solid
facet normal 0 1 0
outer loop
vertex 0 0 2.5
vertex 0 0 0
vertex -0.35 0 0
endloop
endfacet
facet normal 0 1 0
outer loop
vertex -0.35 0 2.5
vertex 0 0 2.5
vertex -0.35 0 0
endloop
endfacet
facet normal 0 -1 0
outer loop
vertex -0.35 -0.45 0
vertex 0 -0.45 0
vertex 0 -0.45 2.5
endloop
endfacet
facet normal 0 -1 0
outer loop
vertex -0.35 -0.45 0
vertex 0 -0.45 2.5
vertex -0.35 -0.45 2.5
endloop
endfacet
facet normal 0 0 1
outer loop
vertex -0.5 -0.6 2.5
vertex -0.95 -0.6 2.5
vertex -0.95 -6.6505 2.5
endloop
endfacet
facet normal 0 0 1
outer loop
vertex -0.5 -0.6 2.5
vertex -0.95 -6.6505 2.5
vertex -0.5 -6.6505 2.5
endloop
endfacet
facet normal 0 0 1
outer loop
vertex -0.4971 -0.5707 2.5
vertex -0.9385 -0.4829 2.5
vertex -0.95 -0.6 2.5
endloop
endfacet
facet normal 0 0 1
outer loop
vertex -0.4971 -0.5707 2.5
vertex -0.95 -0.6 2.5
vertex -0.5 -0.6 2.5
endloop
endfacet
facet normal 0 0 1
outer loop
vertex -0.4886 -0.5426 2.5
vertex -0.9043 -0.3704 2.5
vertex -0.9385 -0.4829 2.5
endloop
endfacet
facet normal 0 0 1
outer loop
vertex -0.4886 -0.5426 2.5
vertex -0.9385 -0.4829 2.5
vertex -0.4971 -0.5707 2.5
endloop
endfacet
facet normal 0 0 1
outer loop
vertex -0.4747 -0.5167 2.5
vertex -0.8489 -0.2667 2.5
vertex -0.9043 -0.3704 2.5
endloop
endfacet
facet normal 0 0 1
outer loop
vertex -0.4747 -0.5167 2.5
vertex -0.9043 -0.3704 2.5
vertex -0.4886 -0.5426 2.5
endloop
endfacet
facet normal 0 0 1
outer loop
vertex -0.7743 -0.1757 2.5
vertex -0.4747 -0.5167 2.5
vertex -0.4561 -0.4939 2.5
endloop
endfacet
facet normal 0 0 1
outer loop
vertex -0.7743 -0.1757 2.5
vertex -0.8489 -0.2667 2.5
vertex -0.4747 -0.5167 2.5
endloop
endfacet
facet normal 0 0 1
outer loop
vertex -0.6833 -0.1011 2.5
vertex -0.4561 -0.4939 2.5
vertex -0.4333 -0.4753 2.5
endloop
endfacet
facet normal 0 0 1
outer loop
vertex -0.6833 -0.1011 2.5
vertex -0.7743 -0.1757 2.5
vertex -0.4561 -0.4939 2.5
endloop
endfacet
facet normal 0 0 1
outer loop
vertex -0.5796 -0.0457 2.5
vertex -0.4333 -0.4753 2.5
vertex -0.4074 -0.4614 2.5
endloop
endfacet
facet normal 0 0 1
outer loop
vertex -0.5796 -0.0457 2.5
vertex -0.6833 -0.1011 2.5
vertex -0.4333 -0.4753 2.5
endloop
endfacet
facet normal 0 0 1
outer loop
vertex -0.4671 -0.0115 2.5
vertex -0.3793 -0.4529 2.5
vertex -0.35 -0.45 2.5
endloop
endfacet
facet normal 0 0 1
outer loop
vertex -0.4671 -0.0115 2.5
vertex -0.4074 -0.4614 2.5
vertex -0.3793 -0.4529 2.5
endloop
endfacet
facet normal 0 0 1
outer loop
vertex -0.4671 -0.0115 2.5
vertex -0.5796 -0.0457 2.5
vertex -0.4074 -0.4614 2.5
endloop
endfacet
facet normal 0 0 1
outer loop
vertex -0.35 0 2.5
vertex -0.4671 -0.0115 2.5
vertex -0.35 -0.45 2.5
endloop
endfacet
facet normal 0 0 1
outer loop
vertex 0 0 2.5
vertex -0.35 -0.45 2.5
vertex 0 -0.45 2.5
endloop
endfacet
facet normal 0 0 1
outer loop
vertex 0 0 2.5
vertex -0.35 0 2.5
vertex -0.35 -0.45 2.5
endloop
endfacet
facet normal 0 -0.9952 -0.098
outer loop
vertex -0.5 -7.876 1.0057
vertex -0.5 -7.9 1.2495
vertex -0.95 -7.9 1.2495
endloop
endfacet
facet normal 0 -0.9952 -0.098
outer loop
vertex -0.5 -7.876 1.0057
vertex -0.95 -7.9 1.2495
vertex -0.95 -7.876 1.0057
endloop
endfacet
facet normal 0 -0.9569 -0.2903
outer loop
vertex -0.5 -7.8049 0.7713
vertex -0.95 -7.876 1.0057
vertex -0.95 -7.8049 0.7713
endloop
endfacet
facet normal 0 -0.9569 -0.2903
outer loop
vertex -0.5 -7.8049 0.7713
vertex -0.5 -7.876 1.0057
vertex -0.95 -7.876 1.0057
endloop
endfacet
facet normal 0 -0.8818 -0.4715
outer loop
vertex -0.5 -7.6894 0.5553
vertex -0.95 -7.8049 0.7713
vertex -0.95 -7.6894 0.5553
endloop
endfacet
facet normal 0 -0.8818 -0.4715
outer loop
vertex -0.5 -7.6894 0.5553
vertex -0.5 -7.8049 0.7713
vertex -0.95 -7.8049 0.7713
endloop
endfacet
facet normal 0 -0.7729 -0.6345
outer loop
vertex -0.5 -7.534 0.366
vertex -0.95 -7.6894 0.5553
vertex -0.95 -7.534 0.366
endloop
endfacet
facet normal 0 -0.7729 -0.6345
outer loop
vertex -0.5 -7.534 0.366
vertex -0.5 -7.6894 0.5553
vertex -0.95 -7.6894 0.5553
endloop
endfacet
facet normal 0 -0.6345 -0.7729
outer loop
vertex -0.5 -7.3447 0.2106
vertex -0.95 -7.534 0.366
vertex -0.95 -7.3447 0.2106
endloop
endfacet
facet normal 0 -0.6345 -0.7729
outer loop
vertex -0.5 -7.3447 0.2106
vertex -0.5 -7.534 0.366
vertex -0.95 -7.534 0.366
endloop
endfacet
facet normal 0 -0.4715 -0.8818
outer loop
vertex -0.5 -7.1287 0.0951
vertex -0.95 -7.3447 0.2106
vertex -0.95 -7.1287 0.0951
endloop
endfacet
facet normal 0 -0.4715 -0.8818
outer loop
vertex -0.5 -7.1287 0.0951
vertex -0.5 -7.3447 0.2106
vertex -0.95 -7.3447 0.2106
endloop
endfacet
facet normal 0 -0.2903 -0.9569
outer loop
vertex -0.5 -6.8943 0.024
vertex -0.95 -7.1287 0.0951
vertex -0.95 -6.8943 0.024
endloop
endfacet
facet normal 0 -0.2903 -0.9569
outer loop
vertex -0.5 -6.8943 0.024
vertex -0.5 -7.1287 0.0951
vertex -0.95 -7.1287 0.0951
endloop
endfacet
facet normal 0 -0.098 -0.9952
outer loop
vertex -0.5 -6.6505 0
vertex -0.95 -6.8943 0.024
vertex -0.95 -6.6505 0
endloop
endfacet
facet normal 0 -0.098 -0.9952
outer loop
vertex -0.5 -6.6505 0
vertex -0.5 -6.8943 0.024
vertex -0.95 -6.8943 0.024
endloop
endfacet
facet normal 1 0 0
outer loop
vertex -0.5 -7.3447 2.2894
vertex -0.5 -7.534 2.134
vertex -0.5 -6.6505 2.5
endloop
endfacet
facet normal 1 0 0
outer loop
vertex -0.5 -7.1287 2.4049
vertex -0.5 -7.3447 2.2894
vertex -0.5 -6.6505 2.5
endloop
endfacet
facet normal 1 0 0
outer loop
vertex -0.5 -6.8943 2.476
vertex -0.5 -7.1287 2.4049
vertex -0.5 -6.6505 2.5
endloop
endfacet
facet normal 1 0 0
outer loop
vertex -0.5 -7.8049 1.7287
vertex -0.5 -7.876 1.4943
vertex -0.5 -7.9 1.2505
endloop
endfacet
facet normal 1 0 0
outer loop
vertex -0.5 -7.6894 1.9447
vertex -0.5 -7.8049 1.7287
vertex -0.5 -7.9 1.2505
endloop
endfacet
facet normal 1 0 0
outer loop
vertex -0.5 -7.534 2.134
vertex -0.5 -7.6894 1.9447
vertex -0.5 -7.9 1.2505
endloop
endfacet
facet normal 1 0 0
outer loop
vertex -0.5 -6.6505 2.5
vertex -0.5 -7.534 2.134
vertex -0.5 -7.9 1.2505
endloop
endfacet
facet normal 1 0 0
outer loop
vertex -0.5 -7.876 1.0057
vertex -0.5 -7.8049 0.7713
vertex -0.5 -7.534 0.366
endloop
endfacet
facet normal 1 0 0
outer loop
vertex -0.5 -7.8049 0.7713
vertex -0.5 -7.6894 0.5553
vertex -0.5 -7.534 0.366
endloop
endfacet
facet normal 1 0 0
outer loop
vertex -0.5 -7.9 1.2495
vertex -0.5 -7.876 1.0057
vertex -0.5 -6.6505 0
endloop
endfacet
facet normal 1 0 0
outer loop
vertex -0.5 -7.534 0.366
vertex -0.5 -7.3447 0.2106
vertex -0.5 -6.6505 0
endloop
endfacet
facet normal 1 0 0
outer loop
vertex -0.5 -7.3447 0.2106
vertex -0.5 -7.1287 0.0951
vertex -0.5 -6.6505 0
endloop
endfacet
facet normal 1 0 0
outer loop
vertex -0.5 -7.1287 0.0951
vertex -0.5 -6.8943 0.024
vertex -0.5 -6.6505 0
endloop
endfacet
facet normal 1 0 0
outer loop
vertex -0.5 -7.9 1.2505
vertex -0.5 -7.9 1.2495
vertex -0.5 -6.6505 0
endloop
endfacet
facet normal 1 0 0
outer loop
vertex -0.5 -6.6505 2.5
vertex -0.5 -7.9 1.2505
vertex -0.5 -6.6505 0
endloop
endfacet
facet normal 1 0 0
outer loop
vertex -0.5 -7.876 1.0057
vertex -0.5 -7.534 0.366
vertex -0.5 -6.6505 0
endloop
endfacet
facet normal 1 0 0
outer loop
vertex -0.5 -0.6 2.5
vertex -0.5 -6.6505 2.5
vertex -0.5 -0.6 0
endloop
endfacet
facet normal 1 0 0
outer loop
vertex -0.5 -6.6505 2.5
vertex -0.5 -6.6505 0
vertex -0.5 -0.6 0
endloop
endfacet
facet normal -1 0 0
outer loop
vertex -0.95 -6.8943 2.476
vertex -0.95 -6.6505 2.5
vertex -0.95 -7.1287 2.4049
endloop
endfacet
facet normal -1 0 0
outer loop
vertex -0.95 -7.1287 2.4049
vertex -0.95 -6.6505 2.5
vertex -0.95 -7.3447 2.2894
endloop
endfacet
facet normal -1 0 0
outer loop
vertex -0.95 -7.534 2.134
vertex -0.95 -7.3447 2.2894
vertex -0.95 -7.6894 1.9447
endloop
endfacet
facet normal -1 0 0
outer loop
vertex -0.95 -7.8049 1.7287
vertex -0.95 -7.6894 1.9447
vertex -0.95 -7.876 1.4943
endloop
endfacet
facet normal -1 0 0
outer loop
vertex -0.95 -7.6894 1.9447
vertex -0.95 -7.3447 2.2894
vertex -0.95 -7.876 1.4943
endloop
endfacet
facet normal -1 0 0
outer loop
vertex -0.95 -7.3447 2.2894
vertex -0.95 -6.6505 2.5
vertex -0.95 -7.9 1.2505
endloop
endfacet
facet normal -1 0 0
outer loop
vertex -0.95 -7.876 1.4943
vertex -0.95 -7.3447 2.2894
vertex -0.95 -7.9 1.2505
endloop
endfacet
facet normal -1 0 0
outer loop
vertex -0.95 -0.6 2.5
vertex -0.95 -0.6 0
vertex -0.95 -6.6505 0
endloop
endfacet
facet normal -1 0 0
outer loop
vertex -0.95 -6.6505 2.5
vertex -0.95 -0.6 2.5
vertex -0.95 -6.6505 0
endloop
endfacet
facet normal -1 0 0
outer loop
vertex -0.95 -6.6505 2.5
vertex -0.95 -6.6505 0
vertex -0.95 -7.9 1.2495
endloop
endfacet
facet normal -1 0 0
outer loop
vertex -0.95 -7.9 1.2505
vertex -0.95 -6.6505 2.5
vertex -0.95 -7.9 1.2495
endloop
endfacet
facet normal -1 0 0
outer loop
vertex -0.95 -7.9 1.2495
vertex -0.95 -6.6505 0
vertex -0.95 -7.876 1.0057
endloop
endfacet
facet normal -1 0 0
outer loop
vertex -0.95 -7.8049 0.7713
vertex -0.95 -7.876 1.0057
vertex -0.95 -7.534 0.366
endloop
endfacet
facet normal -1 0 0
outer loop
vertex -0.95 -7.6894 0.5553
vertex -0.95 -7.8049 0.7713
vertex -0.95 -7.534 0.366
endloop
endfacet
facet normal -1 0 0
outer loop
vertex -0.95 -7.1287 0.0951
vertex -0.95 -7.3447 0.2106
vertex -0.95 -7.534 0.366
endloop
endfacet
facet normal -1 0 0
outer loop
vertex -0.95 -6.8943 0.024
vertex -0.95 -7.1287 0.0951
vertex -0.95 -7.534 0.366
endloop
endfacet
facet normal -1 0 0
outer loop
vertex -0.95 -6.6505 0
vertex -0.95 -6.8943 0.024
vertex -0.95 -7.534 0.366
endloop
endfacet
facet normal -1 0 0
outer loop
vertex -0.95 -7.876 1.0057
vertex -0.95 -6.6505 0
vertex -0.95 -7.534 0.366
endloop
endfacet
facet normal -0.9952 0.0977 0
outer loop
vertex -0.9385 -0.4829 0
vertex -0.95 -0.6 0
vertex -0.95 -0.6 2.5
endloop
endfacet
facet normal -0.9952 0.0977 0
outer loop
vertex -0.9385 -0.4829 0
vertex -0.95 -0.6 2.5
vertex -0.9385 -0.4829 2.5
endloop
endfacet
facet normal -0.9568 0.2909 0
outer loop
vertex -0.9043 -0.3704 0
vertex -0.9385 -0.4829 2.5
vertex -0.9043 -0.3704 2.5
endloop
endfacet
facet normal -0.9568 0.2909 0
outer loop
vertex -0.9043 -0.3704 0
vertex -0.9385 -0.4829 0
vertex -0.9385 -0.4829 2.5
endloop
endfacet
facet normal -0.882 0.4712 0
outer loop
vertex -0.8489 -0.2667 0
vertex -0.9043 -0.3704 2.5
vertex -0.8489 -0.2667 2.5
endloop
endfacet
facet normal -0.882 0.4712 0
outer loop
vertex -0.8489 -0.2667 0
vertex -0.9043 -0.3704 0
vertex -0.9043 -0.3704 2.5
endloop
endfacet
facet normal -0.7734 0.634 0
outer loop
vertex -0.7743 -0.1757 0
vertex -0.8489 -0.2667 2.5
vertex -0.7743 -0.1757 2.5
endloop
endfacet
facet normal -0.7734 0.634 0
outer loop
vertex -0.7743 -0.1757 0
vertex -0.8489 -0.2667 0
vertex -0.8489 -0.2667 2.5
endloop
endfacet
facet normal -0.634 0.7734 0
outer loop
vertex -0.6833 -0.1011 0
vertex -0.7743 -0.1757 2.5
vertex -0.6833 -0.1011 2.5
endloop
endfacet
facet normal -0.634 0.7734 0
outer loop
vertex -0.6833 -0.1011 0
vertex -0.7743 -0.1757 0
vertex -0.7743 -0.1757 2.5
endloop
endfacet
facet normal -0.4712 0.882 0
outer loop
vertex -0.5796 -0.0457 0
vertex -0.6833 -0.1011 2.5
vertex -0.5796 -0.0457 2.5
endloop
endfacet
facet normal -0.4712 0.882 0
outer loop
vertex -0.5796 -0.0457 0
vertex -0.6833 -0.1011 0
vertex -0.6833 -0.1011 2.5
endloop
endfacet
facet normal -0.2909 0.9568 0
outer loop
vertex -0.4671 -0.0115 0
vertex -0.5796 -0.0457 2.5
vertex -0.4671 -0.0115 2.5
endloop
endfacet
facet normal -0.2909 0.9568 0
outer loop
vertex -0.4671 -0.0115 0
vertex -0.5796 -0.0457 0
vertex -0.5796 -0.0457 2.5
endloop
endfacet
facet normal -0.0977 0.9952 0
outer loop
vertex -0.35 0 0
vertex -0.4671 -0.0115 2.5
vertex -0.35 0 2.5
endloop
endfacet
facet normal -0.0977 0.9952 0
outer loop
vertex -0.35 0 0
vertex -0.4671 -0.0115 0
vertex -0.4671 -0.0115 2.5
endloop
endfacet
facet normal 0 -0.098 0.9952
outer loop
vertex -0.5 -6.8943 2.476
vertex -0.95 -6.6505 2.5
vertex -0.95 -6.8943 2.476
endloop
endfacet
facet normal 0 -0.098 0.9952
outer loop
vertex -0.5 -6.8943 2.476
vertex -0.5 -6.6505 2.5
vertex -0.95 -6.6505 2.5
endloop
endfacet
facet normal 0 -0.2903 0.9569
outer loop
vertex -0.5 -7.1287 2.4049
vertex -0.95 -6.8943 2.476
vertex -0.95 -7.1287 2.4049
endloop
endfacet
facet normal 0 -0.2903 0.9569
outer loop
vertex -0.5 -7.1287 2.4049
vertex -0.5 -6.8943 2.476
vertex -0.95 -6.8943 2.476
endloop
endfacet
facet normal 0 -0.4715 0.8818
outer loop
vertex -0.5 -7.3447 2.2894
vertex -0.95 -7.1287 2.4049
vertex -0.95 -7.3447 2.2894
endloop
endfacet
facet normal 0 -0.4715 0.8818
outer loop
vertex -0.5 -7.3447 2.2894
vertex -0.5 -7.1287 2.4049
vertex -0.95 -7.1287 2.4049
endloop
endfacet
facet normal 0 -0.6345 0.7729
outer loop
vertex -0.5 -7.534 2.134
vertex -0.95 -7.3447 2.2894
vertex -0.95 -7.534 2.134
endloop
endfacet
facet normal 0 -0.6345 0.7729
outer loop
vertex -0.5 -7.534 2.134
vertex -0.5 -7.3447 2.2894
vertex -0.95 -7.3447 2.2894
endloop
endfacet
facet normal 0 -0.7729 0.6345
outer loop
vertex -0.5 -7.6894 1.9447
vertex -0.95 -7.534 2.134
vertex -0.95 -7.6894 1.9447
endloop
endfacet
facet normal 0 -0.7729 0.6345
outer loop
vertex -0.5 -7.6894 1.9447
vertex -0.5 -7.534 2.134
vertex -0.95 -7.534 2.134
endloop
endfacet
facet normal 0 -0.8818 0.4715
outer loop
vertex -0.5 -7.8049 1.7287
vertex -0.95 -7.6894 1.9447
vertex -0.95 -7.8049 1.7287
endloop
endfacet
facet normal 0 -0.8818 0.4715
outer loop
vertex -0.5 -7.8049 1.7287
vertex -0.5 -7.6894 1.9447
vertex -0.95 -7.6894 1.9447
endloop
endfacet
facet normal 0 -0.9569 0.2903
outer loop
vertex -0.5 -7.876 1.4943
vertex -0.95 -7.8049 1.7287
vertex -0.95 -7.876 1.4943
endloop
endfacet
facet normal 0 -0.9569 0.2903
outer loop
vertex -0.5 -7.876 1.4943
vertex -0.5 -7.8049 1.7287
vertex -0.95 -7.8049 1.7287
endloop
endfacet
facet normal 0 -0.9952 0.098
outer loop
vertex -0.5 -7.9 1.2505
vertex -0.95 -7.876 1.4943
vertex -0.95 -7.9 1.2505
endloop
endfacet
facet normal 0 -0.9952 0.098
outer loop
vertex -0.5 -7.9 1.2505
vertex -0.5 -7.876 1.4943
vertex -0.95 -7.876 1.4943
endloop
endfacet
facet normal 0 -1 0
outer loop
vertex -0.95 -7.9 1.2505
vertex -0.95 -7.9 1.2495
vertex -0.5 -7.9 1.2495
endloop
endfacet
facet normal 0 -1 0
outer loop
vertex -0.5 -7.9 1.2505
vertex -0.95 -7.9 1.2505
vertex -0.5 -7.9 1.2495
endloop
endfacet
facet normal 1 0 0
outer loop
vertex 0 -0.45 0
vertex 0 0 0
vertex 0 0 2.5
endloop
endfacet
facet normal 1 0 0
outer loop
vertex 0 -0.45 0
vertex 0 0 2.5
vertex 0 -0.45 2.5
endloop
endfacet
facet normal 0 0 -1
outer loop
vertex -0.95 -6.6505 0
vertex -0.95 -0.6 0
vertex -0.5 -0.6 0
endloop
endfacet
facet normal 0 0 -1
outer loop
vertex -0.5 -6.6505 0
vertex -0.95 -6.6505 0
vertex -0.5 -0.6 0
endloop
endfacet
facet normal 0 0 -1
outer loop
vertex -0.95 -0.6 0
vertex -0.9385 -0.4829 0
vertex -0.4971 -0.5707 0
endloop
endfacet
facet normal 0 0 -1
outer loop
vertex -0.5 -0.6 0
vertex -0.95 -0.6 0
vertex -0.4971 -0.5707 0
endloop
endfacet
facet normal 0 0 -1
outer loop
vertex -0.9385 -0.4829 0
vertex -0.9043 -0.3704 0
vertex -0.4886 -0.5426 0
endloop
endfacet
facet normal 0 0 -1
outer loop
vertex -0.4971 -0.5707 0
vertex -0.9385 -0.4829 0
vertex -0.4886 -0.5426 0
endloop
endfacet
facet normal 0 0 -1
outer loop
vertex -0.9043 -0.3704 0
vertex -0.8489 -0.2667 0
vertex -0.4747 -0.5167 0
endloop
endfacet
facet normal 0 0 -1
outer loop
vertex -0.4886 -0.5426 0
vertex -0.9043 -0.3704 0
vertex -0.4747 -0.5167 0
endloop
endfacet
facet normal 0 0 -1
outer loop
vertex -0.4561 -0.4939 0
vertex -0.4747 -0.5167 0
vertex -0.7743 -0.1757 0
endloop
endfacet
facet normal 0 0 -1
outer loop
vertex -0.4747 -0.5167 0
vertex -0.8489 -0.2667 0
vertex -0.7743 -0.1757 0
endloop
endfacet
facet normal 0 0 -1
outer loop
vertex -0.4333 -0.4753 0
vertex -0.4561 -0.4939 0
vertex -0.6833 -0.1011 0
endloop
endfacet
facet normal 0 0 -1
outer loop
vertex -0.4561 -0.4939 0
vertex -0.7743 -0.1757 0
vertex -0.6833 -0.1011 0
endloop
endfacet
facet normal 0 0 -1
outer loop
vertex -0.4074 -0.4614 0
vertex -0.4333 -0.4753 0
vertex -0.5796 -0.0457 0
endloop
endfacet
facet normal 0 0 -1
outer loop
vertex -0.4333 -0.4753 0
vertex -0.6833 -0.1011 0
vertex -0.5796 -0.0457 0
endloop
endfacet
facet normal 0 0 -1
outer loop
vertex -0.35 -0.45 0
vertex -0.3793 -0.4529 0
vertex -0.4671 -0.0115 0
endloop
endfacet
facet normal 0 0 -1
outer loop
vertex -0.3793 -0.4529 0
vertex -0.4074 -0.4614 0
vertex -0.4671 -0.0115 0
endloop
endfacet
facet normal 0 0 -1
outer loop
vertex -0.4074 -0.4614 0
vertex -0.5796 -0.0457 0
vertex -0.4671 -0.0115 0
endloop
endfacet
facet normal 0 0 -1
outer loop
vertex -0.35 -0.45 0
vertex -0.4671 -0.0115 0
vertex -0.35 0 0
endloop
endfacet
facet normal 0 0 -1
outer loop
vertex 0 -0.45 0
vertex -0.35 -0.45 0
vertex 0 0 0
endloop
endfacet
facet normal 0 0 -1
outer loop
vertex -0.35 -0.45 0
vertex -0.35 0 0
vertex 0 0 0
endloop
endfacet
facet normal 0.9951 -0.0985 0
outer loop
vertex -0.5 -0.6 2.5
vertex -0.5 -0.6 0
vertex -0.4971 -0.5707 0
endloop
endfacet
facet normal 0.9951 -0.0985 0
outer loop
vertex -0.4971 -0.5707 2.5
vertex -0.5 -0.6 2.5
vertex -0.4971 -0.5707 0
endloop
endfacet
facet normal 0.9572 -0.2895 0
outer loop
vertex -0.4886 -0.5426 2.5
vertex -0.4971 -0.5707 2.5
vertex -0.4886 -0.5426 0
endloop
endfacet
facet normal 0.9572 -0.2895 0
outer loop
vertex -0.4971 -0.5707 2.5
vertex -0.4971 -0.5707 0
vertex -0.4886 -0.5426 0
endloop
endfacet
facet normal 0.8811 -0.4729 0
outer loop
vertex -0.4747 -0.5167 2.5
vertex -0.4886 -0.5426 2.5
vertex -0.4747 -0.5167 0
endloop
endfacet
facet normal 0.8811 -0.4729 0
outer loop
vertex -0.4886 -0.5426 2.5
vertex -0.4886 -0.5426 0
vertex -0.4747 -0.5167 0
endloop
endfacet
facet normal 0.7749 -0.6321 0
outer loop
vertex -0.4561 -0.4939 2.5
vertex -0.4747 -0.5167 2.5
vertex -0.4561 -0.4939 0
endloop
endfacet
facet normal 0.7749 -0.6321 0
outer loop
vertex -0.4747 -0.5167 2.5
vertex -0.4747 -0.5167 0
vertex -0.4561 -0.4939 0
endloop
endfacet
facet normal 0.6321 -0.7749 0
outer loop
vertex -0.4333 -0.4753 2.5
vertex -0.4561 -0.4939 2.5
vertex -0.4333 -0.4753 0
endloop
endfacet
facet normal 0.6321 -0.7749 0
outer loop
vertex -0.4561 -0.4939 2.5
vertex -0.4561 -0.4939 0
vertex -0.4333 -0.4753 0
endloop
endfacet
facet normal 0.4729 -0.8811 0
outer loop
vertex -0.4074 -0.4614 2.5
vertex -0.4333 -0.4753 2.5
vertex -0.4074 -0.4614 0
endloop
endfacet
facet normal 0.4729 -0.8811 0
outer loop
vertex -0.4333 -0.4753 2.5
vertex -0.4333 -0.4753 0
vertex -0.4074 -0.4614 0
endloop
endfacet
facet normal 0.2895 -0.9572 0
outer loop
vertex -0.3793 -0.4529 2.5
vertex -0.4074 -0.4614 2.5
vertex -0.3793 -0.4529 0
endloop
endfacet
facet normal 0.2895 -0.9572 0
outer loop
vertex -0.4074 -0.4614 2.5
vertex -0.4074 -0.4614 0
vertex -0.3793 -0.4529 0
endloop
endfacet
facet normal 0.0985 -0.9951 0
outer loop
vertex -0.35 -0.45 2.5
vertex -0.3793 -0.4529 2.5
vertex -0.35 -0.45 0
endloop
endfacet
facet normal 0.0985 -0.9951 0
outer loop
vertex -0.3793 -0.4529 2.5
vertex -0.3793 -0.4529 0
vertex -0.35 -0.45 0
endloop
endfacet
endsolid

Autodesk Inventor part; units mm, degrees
ref_plane "YZ Plane" through (0, 0, 0) normal (1, 0, 0) x (0, 1, 0)
ref_plane "XZ Plane" through (0, 0, 0) normal (0, 1, 0) x (-1, 0, 0)
ref_plane "XY Plane" through (0, 0, 0) normal (0, 0, 1) x (1, 0, 0)
sketch "Sketch1" plane through (0, 0, 0) normal (0, 0, 1) x (1, 0, 0)
  line L0 (0, 0) -> (0, -0.45)
  line L1 (0, -0.45) -> (-0.35, -0.45)
  line L2 (0, 0) -> (-0.35, 0)
  arc A0 (-0.35, -0.45) -> (-0.5, -0.6) centre (-0.35, -0.6) ccw
  arc A1 (-0.35, 0) -> (-0.95, -0.6) centre (-0.35, -0.6) ccw
  line L3 (-0.95, -0.6) -> (-0.95, -7.9)
  line L4 (-0.95, -7.9) -> (-0.5, -7.9)
  line L5 (-0.5, -7.9) -> (-0.5, -0.6)
  dimension "d0" = 0.45
  dimension "d2" = 7.9
  dimension "d3" = 0.95
  dimension "d4" = 0.6
extrude "Extrusion1" add sketch "Sketch1" along normal blind 2.5
fillet "Fillet1" radius 1.25 2 edges at (-0.725, -7.9, 2.5) (-0.725, -7.9, 0)
properties material "Brass, Soft Yellow"
